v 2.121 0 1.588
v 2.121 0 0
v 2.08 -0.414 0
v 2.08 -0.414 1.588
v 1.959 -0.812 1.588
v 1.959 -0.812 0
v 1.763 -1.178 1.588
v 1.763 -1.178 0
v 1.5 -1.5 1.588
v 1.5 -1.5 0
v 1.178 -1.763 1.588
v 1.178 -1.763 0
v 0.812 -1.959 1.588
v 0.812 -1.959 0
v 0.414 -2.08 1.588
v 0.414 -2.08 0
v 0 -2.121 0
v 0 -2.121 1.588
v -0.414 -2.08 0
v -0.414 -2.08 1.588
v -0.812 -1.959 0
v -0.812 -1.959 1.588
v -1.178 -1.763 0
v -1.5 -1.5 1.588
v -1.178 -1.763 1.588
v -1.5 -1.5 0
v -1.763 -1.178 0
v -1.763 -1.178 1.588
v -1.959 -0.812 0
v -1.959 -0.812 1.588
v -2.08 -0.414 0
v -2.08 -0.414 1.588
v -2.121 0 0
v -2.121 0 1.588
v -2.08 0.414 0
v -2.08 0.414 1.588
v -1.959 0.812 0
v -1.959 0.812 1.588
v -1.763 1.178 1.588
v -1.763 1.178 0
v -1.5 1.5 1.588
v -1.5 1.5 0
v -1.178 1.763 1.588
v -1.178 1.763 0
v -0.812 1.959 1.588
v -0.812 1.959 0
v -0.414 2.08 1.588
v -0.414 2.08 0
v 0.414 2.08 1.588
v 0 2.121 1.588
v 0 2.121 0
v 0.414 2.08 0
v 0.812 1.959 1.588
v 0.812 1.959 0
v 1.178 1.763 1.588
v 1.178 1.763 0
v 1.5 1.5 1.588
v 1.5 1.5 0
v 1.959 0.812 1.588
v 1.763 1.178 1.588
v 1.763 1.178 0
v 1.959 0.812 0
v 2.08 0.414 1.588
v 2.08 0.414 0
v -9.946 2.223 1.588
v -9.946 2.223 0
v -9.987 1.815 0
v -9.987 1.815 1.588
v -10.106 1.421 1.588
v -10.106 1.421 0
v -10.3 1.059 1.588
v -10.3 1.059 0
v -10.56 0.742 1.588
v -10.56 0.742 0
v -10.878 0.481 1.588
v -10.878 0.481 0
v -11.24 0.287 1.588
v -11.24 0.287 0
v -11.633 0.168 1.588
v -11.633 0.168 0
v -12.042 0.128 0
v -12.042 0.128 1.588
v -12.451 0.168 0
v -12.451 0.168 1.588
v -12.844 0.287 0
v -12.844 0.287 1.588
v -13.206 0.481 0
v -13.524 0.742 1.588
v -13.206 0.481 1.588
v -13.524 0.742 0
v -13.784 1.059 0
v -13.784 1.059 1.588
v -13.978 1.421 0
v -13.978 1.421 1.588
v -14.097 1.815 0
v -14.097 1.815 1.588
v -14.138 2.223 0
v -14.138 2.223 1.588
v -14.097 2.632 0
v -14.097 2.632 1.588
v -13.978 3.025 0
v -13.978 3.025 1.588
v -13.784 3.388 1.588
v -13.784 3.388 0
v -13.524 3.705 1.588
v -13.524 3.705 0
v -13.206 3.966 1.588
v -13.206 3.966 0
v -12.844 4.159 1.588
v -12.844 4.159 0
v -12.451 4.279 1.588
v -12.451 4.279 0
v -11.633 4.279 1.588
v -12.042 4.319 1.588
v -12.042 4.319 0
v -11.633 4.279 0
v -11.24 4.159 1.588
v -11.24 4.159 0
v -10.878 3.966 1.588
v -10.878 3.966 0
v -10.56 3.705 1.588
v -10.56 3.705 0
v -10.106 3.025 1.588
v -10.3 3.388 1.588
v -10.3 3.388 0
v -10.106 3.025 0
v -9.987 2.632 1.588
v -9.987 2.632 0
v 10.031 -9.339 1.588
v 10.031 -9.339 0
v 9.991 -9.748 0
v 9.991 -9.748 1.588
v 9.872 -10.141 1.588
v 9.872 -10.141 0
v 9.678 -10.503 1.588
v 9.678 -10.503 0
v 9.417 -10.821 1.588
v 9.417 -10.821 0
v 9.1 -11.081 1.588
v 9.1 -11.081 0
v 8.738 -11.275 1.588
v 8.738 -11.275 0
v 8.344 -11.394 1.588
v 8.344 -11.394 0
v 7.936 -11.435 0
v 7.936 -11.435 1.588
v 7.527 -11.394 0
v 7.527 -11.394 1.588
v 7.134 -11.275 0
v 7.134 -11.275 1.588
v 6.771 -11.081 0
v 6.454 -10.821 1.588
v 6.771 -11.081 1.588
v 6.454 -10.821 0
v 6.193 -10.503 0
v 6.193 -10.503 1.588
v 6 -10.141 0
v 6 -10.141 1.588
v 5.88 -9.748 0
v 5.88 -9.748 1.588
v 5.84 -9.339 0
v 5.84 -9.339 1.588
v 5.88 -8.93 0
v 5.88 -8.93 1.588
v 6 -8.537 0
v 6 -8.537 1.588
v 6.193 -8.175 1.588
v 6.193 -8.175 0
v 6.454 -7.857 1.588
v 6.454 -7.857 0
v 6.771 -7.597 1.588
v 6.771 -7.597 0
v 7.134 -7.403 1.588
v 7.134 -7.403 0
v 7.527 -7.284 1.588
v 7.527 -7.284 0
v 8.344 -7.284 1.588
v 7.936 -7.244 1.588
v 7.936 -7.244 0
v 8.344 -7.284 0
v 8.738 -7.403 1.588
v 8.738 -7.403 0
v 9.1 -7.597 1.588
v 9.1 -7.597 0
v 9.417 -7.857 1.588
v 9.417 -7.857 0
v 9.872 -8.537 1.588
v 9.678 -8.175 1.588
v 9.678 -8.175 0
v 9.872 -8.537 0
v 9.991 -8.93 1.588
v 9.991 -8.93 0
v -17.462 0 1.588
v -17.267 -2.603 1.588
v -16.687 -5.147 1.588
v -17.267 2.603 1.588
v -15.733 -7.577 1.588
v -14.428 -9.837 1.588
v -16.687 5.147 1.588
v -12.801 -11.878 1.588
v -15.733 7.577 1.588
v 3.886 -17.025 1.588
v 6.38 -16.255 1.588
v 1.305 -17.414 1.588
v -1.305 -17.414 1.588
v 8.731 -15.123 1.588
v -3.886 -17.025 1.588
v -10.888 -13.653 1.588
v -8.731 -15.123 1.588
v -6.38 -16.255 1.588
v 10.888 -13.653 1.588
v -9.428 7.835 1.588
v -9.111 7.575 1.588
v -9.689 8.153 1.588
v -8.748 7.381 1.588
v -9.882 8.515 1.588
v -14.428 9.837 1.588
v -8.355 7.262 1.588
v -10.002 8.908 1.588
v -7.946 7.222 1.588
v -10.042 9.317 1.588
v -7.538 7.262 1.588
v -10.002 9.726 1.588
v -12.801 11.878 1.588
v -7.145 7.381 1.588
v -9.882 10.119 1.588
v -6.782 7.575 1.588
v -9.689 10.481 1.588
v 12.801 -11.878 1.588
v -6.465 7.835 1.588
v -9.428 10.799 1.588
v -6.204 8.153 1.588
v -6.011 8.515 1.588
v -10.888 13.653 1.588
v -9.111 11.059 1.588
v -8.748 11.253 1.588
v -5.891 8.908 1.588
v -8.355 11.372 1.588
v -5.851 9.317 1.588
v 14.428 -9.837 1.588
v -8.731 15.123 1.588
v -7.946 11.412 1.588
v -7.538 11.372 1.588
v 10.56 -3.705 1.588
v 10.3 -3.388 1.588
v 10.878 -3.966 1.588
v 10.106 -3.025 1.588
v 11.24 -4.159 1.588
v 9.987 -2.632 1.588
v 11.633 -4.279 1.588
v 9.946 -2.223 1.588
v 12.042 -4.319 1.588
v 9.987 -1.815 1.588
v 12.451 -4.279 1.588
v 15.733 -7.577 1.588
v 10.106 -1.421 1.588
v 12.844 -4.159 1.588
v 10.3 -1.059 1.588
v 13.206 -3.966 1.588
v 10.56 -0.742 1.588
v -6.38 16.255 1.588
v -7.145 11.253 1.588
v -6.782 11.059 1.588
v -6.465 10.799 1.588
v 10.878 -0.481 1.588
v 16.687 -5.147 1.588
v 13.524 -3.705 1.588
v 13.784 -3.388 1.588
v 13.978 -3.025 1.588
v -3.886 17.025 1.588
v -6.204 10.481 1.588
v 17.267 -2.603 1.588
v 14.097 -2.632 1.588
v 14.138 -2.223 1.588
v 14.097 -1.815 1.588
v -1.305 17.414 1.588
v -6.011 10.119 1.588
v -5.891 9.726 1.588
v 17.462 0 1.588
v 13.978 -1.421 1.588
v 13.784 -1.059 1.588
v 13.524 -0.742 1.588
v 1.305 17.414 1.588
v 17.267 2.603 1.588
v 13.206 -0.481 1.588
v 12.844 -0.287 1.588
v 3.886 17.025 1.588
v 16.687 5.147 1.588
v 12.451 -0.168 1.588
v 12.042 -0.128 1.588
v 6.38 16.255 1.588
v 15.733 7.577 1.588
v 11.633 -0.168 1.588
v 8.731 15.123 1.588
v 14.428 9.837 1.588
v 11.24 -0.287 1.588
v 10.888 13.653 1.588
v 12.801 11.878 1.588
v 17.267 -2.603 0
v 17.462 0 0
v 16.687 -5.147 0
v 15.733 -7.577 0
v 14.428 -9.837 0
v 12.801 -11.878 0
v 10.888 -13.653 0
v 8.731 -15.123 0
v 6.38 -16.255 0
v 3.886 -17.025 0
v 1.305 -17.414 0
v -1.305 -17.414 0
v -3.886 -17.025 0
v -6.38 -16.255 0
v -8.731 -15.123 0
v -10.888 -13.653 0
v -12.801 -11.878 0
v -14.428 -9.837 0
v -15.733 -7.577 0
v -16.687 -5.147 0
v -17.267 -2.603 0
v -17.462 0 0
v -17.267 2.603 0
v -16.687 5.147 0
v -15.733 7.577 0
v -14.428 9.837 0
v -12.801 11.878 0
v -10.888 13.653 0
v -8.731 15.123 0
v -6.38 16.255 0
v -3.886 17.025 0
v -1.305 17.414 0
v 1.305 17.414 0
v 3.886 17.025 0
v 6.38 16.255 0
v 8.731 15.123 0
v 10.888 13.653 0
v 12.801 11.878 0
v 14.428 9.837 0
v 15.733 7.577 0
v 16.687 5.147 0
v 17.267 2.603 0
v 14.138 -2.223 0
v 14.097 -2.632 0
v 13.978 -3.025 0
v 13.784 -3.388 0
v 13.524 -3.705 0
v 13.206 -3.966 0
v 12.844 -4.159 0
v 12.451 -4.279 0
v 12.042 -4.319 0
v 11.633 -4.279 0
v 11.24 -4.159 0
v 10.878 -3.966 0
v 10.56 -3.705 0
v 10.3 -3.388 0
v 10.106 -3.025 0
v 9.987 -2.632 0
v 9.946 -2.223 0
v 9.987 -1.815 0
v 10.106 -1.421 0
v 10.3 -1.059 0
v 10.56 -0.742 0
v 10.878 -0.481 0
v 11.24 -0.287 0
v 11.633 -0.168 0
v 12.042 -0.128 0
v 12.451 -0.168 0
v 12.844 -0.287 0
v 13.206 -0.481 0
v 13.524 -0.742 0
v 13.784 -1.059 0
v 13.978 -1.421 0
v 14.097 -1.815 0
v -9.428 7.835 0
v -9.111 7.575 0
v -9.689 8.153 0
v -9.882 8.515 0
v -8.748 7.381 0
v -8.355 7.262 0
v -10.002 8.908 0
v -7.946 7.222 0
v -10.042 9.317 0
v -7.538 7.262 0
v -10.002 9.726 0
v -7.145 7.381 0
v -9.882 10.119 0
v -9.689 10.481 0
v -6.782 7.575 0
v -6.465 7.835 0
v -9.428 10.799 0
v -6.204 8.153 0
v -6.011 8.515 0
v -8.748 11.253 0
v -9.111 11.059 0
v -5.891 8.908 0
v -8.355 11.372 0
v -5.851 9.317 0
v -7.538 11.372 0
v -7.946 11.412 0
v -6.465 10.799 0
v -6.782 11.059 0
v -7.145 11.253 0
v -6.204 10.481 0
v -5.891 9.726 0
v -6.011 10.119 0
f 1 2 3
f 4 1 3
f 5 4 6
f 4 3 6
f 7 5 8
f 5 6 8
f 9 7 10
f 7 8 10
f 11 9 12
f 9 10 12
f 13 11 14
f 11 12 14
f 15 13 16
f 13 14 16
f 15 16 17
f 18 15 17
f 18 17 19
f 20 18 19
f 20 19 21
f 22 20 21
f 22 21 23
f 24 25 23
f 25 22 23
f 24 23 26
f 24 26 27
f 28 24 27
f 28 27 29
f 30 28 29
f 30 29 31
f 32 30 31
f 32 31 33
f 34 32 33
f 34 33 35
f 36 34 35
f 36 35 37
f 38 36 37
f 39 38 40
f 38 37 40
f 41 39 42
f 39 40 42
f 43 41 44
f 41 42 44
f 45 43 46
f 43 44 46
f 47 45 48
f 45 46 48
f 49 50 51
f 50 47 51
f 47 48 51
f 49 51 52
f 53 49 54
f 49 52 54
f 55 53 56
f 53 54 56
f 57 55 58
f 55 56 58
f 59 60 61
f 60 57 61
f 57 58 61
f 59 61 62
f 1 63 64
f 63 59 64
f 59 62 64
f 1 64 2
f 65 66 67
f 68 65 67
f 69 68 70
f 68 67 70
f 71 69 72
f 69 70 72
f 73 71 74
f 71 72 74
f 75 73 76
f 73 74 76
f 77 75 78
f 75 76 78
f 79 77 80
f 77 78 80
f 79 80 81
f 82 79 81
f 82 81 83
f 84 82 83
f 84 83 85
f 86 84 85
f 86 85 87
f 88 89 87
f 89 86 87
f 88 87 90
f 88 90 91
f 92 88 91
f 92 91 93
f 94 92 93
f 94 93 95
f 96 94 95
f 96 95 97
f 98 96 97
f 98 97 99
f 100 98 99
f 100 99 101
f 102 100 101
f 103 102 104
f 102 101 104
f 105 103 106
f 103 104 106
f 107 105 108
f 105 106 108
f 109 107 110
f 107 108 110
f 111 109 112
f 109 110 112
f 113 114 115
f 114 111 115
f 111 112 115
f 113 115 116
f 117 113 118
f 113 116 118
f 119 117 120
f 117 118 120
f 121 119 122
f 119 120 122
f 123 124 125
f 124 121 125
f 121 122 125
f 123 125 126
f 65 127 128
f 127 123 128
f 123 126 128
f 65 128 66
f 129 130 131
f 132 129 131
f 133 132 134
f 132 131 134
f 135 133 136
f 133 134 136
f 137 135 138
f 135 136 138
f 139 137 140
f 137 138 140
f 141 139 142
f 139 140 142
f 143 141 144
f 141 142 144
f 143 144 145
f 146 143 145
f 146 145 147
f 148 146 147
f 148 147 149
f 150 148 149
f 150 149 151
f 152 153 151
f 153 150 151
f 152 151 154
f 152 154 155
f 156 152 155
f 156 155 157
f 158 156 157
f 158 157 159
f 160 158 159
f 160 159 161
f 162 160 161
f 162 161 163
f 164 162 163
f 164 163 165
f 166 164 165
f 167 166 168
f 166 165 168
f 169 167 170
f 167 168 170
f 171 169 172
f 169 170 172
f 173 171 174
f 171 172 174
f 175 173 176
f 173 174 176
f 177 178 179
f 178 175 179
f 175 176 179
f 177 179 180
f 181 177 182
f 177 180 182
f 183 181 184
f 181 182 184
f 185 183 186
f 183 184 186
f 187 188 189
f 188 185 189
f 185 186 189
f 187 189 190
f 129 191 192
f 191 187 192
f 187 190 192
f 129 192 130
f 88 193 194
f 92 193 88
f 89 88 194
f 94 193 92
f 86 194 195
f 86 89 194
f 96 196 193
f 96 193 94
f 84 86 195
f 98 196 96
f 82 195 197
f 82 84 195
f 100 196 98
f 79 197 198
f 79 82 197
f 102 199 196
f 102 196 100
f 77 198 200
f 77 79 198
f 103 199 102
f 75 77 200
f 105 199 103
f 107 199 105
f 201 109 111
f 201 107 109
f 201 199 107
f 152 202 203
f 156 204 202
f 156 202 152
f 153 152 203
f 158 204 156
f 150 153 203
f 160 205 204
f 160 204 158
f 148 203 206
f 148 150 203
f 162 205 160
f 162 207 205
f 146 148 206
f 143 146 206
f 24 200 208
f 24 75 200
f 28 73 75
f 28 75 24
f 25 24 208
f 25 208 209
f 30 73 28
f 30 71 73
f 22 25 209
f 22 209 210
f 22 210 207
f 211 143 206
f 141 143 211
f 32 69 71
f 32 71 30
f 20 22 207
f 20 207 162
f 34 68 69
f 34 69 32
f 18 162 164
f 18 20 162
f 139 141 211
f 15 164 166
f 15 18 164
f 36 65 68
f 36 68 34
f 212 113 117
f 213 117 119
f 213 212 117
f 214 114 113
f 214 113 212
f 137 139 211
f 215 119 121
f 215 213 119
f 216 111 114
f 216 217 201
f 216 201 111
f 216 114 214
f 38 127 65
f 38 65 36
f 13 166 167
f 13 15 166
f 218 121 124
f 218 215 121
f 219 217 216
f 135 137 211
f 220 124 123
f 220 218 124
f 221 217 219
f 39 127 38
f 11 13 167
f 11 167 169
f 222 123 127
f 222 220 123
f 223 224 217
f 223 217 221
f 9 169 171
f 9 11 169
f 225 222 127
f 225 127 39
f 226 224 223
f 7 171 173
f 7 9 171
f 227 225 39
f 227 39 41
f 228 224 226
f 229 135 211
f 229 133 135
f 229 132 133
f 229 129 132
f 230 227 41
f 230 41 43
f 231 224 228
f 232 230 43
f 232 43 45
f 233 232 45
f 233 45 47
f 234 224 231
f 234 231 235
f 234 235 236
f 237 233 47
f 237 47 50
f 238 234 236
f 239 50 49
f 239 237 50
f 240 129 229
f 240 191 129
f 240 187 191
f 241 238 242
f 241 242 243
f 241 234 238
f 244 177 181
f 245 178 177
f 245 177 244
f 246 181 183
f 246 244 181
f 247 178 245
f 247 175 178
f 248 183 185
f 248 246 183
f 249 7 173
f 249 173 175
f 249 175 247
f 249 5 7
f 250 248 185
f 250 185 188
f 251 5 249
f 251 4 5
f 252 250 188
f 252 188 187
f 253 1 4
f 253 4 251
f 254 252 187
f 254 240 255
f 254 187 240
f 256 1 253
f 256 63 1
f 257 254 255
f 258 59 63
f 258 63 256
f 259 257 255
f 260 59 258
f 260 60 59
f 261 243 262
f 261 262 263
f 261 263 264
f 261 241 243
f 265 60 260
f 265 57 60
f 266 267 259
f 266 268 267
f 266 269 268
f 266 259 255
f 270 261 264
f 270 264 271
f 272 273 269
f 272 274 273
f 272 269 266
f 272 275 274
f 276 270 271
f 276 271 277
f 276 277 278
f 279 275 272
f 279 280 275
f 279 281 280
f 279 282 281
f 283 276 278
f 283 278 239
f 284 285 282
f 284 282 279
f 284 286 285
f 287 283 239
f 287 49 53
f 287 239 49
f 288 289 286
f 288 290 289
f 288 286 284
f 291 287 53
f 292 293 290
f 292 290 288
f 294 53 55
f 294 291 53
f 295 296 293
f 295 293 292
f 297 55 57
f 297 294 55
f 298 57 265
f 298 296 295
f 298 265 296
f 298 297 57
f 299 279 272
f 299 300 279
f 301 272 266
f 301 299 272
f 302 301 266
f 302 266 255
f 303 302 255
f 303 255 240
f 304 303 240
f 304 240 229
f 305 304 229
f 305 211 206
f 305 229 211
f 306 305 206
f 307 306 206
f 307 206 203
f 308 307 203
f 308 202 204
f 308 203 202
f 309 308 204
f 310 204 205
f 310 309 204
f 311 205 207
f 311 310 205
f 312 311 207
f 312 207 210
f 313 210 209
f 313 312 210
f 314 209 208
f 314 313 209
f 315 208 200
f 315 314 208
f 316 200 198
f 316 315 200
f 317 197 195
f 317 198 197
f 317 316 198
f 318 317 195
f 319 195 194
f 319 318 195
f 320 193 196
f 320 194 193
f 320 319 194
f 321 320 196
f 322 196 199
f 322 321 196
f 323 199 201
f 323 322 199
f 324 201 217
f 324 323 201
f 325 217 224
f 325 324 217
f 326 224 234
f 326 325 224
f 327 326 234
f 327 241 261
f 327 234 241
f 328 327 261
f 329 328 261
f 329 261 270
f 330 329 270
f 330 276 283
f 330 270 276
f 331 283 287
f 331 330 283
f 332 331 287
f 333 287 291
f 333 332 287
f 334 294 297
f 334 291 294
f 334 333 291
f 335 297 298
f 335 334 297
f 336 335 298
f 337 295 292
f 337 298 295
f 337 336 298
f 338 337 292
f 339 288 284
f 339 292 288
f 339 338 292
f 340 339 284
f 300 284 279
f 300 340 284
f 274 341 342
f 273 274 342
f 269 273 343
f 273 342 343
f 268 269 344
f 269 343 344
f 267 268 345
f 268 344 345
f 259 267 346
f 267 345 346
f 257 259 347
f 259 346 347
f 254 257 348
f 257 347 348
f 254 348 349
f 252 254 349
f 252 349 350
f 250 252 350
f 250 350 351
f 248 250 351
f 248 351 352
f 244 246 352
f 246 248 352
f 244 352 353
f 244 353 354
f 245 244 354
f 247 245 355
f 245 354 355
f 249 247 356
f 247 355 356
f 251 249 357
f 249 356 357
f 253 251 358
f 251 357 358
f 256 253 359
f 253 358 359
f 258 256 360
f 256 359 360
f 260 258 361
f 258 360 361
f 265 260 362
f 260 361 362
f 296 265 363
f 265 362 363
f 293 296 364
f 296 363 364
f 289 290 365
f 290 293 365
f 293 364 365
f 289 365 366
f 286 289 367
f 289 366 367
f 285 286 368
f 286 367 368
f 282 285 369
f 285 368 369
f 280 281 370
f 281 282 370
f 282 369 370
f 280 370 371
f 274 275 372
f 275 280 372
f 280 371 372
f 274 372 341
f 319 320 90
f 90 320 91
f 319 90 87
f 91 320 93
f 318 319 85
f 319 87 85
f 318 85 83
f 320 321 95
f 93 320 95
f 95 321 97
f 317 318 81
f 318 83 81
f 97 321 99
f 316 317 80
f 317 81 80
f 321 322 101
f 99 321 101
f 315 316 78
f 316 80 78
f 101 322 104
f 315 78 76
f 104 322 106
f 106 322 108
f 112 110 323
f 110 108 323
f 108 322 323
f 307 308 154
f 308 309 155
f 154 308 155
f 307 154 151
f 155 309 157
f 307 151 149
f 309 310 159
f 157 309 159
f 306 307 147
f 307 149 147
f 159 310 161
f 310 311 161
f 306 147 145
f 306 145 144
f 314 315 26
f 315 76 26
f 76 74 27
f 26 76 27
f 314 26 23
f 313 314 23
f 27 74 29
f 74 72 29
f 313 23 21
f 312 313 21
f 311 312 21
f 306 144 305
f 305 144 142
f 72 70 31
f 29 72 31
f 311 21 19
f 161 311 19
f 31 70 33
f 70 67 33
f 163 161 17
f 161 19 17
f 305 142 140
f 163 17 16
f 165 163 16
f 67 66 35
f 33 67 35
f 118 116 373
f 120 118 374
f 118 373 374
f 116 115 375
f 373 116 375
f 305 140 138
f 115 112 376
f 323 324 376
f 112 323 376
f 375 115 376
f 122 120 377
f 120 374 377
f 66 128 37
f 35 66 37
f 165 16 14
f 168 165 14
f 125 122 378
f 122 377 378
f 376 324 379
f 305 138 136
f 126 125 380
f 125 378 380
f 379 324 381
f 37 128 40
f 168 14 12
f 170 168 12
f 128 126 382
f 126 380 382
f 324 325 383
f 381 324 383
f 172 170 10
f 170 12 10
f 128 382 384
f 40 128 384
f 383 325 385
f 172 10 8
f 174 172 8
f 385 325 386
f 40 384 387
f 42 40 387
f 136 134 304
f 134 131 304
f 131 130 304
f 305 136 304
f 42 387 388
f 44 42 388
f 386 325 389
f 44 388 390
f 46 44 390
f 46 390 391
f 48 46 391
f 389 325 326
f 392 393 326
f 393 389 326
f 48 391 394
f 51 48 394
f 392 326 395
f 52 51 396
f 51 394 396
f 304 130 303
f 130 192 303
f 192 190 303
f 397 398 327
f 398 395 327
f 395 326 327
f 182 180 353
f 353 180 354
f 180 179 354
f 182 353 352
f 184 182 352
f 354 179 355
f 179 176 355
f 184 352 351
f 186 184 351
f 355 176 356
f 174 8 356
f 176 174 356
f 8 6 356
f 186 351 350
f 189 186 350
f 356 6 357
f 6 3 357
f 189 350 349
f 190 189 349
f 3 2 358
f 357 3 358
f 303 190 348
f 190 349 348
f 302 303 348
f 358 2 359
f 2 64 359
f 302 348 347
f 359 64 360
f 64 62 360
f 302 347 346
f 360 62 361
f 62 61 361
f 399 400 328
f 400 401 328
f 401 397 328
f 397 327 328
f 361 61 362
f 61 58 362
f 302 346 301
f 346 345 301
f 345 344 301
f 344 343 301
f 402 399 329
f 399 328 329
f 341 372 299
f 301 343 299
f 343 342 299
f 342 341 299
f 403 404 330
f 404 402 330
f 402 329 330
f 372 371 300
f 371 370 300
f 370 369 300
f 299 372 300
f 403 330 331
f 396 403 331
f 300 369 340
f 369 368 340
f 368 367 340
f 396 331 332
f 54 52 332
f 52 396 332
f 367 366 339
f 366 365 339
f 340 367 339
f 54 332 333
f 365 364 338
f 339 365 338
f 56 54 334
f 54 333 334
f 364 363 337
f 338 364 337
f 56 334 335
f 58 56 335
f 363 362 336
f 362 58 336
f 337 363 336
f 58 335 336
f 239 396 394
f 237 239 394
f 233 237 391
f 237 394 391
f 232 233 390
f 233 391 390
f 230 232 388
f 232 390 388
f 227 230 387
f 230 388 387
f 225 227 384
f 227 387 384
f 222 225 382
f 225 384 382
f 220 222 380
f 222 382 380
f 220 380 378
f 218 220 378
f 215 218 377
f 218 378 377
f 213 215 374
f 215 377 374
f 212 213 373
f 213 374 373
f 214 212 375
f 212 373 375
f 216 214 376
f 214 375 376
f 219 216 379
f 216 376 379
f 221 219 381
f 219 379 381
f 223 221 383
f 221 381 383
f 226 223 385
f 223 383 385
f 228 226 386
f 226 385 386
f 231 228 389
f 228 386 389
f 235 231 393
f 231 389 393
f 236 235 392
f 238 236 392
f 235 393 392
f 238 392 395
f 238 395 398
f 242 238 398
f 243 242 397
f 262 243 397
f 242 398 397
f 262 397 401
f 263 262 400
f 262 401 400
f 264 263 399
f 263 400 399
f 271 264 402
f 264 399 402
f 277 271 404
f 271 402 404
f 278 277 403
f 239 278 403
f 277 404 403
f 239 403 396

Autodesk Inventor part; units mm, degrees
ref_plane "YZ Plane" through (0, 0, 0) normal (1, 0, 0) x (0, 1, 0)
ref_plane "XZ Plane" through (0, 0, 0) normal (0, 1, 0) x (-1, 0, 0)
ref_plane "XY Plane" through (0, 0, 0) normal (0, 0, 1) x (1, 0, 0)
sketch "main" plane through (0, 0, 0) normal (0, 0, 1) x (1, 0, 0)
  circle A0 centre (-3.5355, 3.6269) radius 17.4625
  arc A1 (-12.4711, 11.0953) -> (-10.1649, 11.3129) centre (-11.4711, 12.8274) ccw
  circle A2 centre (4.4001, -5.7121) radius 2.0955
  circle A3 centre (8.5065, 1.4036) radius 2.0955
  circle A4 centre (-11.482, 12.9439) radius 2.0955
  circle A5 centre (-15.5775, 5.8503) radius 2.0955
  circle A6 centre (-3.5355, 3.6269) radius 2.1209
  point P0 (-4.7735, 4.9064)
  point P1 (3.0939, -4.059)
  point P2 (5.4001, -3.8415)
  dimension "d0" = 4.191
  dimension "d1" = 34.925
  dimension "d2" = 4.191
  dimension "d3" = 4.191
  dimension "d4" = 4.191
  dimension "d5" = 4.2418
sketch "Sketch1" plane through (0, 0, 0) normal (0, 0, 1) x (1, 0, 0)
  circle A0 centre (0, 0) radius 17.4625
  arc A1 (-8.9356, 7.4684) -> (-6.6294, 7.686) centre (-7.9356, 9.2004) ccw
  circle A2 centre (7.9356, -9.3391) radius 2.0955
  circle A3 centre (12.042, -2.2234) radius 2.0955
  circle A4 centre (-7.9465, 9.317) radius 2.0955
  circle A5 centre (-12.042, 2.2234) radius 2.0955
  circle A6 centre (0, 0) radius 2.1209
extrude "Extrusion1" add sketch "Sketch1" along normal blind 1.5875 contours A0 | A4 A1
properties part number "2in_flex_wheel_hub" material "Acetal Resin, White"
